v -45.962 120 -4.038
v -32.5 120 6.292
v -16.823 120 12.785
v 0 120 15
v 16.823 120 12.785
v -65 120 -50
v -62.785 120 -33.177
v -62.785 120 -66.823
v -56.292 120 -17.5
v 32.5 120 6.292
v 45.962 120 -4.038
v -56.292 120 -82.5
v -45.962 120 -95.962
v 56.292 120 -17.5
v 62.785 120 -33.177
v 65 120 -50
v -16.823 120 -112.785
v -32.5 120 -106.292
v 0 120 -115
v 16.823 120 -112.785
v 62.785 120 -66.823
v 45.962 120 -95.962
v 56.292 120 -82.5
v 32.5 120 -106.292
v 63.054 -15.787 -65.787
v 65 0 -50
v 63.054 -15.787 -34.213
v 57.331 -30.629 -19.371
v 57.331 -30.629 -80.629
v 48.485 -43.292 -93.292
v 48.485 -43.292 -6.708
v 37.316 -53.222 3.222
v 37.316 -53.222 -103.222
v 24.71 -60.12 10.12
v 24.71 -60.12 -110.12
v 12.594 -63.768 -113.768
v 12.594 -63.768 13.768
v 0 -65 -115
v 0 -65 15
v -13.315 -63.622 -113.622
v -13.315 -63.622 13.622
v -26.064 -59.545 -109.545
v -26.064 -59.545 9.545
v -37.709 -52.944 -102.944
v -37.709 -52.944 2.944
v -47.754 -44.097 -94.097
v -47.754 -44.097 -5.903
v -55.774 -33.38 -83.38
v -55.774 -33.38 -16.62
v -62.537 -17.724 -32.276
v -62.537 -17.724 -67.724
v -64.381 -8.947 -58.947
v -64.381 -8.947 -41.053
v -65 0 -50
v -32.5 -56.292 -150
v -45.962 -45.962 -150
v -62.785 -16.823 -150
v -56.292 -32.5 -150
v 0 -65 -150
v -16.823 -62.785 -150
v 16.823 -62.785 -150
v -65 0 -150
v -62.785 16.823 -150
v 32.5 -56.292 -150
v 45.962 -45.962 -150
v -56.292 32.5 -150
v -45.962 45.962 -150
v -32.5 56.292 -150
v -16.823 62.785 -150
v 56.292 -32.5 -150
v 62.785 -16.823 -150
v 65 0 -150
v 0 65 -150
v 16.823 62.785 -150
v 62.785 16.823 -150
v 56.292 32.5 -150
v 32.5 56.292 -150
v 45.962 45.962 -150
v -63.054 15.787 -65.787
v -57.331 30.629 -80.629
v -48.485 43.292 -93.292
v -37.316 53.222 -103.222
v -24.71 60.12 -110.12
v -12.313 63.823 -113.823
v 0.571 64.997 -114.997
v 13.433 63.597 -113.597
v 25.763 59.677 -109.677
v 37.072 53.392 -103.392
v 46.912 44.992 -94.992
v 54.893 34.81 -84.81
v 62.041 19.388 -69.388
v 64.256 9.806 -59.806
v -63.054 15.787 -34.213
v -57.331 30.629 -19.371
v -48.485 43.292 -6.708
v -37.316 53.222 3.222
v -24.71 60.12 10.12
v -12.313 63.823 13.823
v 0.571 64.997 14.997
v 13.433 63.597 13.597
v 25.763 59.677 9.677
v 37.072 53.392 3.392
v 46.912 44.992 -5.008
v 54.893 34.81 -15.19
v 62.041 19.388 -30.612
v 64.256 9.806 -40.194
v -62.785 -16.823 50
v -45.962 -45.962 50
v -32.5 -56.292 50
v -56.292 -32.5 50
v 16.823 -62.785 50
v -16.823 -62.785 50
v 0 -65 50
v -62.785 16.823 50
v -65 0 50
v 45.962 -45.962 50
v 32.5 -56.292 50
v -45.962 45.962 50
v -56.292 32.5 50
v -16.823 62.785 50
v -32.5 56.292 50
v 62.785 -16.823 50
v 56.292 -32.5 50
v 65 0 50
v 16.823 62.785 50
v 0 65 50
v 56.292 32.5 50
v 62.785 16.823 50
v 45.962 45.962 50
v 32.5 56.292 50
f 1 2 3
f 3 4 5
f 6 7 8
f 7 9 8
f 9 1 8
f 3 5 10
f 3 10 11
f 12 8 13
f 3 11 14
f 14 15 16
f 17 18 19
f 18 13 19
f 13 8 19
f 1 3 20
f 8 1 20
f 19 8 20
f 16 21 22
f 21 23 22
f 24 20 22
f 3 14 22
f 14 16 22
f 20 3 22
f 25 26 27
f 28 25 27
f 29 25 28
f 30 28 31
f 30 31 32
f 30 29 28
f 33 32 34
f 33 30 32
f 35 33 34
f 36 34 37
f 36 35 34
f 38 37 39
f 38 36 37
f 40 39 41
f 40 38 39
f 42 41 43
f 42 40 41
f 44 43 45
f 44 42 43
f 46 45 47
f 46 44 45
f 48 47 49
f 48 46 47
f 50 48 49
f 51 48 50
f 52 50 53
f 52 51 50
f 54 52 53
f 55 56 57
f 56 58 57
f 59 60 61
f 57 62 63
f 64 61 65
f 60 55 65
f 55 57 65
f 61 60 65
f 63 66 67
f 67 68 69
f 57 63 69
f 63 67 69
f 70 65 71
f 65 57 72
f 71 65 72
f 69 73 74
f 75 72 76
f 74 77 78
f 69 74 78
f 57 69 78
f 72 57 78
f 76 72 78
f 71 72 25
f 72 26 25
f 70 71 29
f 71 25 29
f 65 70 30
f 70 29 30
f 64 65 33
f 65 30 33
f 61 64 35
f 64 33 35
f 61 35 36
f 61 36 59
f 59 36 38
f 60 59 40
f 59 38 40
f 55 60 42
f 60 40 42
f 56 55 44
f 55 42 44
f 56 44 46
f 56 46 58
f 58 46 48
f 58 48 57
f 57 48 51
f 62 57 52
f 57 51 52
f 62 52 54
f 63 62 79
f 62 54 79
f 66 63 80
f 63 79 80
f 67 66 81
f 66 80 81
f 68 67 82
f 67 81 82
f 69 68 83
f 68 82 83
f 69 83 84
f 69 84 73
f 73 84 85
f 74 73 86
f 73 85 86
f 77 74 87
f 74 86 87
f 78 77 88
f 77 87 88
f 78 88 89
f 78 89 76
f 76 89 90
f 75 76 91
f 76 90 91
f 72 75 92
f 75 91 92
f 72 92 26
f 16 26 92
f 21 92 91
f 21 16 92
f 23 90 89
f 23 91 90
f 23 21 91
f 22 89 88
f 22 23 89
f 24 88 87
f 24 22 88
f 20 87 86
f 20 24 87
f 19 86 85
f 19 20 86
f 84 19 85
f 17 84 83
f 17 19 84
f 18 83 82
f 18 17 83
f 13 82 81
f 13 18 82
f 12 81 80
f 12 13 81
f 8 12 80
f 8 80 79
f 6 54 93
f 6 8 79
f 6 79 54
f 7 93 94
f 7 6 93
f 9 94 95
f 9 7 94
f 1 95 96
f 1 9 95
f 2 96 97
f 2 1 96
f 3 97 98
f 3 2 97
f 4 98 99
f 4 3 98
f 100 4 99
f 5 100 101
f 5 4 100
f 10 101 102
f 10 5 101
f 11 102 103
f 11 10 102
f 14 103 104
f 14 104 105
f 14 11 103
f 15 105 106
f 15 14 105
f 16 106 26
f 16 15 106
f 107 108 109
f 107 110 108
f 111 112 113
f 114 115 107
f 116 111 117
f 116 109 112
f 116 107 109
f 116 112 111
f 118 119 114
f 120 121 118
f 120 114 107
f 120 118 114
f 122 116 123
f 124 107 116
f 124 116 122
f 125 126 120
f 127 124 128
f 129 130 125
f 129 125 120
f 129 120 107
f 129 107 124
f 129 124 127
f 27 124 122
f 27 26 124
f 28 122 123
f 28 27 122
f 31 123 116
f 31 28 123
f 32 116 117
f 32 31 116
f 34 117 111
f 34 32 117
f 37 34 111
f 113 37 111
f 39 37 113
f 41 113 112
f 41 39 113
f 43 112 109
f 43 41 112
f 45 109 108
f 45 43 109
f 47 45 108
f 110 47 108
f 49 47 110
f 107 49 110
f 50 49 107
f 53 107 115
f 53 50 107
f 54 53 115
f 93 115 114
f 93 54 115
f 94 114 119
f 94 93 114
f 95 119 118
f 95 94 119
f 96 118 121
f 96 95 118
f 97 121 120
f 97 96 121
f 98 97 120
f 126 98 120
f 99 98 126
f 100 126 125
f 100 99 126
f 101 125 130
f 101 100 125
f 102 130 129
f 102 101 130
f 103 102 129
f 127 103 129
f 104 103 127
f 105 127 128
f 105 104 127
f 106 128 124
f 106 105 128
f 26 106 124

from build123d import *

# Parameters (mm, degrees)
SKETCH2_R = 65


with BuildPart() as part:
    # Sweep1: sweep along a path in Sketch1
    with BuildLine(Plane(origin=(0, 0, 0), x_dir=(0, 0, -1), z_dir=(1, 0, 0))) as sweep1_path:
        Line((-50, 0), (50, 0))
        Line((50, 0), (50, 120))
    # Sketch2 → Sweep1 (sweep)
    with BuildSketch(Plane.XY.offset(50)):
        Circle(SKETCH2_R)
    sweep1 = sweep(path=sweep1_path.line, transition=Transition.RIGHT)

    # Mirror1: Sweep1 across plane
    add(sweep1.mirror(Plane.XY.offset(-50)))


solid = part.part
